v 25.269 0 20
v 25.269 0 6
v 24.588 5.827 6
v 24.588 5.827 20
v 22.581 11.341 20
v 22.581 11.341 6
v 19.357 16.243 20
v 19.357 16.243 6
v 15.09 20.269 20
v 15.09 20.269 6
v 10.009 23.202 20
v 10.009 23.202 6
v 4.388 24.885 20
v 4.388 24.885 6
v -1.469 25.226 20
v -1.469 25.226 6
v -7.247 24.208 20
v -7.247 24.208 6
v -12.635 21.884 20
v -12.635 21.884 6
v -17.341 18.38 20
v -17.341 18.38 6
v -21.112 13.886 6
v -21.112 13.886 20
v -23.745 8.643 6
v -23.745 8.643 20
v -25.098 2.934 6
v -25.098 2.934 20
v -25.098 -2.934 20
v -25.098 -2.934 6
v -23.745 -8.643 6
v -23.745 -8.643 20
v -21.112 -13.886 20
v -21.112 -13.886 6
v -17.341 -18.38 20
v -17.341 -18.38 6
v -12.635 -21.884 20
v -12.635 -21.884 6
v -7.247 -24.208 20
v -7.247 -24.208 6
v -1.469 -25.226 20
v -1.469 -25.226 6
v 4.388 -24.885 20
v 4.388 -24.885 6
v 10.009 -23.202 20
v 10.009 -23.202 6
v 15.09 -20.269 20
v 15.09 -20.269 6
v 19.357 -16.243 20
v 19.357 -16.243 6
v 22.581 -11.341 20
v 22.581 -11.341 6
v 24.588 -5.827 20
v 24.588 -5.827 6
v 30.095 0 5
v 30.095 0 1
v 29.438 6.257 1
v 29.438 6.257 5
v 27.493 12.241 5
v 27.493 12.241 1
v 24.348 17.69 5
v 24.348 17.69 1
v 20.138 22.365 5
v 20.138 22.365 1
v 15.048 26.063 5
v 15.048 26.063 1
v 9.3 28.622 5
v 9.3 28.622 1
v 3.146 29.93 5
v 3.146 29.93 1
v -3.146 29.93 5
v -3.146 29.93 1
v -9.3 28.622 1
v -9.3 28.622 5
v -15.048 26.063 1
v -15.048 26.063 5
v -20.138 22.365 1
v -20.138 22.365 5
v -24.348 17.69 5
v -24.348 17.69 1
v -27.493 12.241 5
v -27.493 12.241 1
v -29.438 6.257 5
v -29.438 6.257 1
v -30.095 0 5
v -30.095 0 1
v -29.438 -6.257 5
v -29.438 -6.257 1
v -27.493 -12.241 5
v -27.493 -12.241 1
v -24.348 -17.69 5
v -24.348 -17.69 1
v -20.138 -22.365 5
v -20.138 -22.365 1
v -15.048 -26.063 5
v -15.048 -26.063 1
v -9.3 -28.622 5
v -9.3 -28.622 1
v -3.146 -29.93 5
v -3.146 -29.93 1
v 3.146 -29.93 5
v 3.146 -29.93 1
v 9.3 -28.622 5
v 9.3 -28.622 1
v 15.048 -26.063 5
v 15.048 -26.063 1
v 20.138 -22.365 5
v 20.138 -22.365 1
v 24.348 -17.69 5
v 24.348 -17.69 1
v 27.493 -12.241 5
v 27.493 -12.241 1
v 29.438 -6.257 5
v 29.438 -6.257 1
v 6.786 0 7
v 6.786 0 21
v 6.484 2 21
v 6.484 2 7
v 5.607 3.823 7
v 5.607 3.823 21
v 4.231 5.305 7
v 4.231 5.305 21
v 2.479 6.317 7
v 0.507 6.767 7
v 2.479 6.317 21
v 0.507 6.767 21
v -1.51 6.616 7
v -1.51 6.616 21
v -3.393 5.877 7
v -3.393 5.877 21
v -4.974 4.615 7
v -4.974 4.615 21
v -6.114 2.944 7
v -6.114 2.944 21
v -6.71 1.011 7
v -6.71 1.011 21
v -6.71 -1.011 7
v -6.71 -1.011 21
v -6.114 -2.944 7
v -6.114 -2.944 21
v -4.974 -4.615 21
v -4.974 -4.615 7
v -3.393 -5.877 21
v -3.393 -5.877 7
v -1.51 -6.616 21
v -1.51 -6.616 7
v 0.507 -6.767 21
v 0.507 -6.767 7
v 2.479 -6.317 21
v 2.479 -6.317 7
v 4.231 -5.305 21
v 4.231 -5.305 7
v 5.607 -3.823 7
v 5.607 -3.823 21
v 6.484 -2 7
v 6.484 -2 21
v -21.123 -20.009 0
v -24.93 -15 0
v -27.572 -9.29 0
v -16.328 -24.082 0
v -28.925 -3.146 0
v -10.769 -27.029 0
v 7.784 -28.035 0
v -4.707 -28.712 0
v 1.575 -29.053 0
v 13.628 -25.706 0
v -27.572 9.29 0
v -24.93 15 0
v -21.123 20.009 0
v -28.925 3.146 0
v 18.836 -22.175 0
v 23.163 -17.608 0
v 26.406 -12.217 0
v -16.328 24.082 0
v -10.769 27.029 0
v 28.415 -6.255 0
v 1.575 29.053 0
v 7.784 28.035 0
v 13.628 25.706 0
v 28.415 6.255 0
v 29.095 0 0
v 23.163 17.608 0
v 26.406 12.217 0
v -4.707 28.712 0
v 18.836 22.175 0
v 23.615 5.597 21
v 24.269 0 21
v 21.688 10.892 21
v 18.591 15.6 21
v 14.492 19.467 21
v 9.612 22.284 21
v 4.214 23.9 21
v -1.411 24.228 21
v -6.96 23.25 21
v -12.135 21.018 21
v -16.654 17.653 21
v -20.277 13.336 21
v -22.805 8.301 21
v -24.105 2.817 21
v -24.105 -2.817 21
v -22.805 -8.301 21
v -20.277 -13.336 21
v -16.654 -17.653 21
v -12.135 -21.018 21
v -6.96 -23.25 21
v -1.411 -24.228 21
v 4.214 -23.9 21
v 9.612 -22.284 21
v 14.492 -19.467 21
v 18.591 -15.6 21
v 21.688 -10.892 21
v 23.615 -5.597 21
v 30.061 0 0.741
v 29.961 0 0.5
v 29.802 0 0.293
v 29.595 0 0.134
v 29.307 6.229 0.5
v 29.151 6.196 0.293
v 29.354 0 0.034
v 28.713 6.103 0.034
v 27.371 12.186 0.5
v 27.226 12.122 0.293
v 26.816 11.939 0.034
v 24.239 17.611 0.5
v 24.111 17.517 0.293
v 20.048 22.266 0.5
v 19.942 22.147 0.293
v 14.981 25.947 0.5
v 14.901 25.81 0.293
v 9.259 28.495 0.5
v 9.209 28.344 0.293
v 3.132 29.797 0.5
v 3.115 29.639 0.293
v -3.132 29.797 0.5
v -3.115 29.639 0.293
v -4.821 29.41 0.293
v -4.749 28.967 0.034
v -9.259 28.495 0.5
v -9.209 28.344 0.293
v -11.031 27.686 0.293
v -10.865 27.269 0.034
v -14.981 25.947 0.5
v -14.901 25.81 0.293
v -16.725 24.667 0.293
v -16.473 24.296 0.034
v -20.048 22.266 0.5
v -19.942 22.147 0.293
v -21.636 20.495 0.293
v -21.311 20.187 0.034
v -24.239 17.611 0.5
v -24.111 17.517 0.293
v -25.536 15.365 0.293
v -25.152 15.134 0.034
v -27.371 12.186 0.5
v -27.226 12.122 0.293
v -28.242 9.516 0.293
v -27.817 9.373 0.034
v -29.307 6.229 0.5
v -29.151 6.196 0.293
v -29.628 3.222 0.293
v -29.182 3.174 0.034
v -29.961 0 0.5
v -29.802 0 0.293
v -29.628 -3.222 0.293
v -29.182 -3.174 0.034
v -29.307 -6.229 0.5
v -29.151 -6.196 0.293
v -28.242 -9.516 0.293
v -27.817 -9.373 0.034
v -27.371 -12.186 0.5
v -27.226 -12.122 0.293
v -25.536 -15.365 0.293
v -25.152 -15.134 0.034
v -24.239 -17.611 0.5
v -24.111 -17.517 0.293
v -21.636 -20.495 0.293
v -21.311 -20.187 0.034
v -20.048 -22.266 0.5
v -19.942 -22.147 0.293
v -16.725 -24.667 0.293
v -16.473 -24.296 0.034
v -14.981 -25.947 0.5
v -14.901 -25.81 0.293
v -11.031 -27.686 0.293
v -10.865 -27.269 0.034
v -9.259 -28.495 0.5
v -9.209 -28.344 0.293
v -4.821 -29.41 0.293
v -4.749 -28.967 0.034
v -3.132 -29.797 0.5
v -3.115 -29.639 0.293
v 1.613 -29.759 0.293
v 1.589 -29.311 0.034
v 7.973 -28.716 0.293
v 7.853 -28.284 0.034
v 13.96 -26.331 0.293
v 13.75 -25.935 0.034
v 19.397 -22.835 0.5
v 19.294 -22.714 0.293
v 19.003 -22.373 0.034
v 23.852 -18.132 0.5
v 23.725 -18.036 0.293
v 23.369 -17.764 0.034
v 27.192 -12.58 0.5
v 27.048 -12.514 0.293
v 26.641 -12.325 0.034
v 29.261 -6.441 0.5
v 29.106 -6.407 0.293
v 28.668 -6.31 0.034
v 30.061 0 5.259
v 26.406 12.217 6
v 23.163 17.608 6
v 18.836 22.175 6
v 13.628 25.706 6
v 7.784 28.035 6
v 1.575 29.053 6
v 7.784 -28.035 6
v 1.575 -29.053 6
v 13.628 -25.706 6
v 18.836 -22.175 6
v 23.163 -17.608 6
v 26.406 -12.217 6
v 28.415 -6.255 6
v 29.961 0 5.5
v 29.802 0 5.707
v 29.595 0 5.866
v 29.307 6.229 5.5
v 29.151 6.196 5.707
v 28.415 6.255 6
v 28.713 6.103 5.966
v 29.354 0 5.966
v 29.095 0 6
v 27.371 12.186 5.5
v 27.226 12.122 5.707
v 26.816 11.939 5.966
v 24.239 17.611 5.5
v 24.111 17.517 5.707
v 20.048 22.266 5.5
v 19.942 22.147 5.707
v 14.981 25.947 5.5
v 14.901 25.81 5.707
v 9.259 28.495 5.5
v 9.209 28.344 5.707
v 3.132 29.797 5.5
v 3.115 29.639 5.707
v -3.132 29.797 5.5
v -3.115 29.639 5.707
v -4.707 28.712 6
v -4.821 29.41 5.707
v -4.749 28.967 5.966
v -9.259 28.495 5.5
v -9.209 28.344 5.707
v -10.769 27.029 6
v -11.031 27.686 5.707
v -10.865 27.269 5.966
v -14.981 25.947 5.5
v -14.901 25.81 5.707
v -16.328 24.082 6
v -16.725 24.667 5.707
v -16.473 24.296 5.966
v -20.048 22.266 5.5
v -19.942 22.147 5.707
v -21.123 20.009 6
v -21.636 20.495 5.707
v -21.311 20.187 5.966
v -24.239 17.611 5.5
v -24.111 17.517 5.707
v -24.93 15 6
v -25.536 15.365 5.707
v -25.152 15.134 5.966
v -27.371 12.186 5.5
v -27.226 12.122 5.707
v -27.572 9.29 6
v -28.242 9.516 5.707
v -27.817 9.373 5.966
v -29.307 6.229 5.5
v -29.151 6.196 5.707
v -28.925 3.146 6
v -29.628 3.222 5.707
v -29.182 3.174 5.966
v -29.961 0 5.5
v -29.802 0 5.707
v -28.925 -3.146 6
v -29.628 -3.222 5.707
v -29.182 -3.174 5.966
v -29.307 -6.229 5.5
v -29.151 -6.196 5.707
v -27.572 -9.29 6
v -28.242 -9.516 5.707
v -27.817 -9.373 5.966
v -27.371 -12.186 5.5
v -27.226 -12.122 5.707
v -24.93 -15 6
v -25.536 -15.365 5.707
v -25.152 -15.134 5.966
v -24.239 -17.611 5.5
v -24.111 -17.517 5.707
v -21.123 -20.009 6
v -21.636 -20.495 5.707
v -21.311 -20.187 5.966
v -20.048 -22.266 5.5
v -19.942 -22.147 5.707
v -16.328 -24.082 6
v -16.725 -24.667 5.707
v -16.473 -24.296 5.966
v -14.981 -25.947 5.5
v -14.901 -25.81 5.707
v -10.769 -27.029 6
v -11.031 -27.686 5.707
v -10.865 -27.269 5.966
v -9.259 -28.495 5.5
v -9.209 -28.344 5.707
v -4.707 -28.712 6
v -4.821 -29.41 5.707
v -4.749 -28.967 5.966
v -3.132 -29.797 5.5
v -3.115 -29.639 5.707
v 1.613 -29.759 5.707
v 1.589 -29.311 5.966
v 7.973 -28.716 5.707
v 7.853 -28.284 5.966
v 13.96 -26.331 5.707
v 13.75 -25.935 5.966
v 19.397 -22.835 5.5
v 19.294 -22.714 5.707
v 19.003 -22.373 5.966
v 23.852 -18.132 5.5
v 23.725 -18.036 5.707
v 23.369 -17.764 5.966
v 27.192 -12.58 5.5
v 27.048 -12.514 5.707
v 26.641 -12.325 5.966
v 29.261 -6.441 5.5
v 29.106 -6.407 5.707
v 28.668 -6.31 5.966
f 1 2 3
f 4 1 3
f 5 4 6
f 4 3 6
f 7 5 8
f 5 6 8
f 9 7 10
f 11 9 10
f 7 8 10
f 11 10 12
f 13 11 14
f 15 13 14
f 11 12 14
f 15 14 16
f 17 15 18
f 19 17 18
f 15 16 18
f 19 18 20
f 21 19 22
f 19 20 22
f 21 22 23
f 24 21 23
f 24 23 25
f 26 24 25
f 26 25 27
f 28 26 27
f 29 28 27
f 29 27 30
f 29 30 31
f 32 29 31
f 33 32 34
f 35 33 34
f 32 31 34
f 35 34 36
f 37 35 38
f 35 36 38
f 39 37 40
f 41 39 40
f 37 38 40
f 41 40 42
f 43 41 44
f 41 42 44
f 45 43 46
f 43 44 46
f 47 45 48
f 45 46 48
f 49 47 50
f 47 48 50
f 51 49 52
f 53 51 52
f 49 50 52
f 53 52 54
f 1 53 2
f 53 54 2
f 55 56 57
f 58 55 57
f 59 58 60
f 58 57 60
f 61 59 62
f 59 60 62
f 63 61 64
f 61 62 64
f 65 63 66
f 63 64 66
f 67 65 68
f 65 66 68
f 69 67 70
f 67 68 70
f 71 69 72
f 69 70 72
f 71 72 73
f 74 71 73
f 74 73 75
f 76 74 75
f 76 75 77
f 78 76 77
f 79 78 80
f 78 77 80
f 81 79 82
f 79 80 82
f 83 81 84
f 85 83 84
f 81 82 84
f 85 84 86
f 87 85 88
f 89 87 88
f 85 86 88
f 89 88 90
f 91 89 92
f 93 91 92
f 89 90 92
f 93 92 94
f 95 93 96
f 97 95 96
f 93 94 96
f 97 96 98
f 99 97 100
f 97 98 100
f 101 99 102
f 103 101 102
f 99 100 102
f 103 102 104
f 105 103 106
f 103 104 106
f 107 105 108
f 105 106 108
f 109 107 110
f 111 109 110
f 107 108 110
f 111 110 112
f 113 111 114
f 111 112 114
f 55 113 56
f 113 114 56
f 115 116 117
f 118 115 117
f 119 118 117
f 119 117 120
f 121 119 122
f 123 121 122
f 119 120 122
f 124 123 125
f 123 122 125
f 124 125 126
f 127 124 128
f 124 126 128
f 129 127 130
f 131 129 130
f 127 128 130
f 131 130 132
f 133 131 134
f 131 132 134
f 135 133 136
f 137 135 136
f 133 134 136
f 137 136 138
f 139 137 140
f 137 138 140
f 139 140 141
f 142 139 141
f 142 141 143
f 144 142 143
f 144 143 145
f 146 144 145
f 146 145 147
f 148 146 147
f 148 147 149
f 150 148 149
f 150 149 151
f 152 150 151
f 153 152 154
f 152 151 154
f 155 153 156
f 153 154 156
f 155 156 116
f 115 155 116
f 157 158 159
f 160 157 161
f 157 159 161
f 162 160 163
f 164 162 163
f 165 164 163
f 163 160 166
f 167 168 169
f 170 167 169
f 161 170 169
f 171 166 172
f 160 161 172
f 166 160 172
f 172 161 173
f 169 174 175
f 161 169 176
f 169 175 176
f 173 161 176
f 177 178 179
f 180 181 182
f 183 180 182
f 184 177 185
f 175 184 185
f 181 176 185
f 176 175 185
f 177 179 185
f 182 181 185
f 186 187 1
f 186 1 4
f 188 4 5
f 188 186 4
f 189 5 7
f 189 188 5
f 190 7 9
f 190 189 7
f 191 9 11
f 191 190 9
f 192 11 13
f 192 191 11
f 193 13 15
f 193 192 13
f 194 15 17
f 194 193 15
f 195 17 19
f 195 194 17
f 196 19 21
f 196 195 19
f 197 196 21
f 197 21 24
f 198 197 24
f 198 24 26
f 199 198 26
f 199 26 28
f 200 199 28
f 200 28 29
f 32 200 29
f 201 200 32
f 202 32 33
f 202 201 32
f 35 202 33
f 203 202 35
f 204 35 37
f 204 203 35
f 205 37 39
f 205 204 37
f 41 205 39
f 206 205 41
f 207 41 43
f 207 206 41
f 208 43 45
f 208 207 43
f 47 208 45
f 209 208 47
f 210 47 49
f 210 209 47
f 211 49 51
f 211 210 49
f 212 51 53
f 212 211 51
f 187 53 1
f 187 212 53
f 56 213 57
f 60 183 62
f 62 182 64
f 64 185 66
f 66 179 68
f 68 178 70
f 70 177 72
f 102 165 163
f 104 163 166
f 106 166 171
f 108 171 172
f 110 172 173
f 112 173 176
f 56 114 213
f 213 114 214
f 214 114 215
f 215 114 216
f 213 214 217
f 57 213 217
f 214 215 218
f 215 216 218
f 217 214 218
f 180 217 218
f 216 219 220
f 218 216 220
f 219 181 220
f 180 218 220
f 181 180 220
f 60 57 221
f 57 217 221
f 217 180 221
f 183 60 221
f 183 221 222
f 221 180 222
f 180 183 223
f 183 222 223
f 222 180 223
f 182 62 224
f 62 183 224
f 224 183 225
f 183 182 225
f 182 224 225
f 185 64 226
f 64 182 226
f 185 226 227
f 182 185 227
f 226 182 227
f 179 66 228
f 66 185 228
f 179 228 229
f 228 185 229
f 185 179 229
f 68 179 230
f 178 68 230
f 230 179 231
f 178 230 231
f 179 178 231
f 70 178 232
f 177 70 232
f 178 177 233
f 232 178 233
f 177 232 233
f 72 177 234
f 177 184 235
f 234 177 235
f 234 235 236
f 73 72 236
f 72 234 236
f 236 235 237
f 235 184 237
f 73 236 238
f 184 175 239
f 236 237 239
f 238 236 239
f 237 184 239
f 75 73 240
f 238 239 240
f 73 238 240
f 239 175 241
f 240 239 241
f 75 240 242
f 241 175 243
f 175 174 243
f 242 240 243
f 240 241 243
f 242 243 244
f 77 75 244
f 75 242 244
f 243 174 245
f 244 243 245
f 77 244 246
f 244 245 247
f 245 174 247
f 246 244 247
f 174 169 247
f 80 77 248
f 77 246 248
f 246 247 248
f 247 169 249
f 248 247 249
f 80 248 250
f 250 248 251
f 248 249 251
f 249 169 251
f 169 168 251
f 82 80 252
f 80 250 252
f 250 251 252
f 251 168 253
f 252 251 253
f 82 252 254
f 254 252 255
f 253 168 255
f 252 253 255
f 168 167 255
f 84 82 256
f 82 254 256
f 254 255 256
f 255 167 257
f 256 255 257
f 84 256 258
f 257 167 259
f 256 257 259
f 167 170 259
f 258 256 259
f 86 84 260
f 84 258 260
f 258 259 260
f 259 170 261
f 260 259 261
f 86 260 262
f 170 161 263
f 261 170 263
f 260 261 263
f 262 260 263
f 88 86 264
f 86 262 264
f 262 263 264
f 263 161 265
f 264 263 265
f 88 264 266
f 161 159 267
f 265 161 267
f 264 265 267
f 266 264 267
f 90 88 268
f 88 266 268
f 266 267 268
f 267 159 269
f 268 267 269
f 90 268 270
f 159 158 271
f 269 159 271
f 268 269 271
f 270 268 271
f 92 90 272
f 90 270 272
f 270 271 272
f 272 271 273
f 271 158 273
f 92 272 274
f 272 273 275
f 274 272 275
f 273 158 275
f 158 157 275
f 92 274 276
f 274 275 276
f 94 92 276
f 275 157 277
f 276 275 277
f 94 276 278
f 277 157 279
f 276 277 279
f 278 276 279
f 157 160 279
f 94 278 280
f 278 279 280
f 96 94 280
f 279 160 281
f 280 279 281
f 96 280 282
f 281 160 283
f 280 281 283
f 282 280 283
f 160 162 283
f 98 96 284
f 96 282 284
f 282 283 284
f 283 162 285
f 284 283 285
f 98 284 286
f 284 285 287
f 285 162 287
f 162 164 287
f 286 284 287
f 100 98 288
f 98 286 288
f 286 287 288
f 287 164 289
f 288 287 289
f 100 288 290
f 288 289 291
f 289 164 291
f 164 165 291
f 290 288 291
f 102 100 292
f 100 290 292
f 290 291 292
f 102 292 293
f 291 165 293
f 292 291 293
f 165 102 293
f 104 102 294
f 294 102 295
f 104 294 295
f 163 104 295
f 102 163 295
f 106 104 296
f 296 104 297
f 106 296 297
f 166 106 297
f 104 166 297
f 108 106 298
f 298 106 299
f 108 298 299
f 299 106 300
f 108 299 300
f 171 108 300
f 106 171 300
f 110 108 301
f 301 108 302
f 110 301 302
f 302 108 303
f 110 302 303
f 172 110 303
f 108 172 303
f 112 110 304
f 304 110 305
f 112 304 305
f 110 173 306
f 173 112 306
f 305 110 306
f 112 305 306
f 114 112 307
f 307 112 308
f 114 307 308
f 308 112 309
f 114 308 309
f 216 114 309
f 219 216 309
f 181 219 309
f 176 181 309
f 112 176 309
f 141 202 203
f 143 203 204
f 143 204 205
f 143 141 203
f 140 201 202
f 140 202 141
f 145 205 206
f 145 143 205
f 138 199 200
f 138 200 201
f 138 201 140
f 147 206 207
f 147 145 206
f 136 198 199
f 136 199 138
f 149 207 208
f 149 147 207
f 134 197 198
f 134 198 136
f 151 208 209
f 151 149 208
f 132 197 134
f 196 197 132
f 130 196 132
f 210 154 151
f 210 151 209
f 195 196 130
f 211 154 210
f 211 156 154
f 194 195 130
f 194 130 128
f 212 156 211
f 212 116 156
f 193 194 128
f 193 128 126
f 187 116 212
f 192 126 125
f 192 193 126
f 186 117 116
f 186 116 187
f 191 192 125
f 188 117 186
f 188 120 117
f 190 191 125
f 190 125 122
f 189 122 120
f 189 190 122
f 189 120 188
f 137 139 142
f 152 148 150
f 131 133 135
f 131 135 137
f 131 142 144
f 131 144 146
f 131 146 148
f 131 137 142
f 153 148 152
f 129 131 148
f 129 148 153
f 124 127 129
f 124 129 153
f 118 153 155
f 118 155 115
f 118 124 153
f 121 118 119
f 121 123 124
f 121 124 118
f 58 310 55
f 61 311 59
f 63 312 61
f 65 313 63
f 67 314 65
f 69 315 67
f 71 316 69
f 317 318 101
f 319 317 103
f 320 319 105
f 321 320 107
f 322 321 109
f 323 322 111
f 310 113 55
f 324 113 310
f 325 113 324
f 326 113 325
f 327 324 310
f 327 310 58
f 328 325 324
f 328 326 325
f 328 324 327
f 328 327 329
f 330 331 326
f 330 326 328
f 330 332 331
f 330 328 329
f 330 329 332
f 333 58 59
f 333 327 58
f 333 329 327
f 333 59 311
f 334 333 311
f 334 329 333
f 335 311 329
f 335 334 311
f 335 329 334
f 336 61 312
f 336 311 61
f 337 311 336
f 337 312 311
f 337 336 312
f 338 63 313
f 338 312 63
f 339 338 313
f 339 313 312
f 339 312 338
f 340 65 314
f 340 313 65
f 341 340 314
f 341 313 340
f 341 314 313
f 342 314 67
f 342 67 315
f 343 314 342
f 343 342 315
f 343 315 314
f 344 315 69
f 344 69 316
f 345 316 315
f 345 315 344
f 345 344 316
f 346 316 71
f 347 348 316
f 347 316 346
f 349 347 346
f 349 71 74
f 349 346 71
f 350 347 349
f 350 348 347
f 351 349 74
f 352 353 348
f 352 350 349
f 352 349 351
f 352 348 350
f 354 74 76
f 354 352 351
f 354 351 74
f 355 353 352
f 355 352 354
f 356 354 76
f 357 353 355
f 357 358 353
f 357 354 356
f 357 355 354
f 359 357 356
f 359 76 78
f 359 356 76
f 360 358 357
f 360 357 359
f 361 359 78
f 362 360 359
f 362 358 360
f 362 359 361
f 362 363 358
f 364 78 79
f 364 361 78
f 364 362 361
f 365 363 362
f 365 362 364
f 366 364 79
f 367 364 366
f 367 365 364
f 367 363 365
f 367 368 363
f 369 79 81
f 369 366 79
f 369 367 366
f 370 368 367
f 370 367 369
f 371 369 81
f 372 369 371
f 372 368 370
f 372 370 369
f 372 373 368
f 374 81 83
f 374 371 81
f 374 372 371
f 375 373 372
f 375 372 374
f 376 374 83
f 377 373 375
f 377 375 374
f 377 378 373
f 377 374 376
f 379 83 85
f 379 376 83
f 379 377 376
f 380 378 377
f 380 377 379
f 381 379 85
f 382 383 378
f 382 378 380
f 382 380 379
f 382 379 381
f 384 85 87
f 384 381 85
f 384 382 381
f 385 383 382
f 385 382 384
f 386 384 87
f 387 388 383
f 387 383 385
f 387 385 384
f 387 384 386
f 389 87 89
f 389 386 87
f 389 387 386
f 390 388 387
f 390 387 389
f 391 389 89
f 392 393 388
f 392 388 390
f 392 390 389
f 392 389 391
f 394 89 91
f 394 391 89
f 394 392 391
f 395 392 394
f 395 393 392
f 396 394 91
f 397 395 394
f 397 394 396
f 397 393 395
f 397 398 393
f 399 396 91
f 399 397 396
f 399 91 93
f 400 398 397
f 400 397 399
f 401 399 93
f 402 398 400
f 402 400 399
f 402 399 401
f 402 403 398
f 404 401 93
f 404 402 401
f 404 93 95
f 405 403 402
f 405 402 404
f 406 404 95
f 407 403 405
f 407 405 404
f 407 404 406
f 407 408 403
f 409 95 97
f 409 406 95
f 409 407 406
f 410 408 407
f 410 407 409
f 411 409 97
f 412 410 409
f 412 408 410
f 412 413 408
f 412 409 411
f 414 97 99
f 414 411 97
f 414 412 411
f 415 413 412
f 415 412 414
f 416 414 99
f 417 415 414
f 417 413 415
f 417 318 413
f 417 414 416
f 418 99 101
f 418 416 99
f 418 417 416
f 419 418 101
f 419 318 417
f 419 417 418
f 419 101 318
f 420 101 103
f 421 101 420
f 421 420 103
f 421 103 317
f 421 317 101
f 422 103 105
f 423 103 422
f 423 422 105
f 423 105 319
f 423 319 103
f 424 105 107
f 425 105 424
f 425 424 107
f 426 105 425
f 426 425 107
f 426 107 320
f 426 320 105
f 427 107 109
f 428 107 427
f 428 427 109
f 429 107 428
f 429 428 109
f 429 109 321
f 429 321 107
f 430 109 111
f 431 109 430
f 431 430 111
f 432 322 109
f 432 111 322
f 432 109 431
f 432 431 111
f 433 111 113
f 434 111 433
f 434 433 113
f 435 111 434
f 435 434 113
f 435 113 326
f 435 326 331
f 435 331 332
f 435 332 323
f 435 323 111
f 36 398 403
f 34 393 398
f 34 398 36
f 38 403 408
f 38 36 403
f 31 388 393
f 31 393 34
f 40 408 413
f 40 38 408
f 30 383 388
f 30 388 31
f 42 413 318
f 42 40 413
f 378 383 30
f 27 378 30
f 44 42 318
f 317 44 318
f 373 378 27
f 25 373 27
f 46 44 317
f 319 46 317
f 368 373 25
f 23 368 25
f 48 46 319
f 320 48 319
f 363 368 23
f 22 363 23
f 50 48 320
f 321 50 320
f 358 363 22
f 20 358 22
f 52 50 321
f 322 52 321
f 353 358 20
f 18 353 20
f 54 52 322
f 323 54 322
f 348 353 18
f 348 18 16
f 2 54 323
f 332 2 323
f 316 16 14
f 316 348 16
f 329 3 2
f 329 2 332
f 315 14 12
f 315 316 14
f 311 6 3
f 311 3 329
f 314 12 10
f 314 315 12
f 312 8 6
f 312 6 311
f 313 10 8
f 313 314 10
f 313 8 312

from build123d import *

# Parameters (mm, degrees)
F0_R     = 30.095245
F1_DEPTH = 6
F2_R     = 25.269078
F3_DEPTH = 15
F4_R     = 6.785687
F5_DEPTH = 14
F6_R     = 1
F7_R     = 1
F8_SIZE  = 1


with BuildPart() as f1:
    # F0 (on Top) → F1 (new body)
    with BuildSketch(Plane.XY):
        Circle(F0_R)
    extrude(amount=F1_DEPTH)

    # F2 (on face) → F3 (join)
    with BuildSketch(Plane.XY.offset(6)):
        Circle(F2_R)
    extrude(amount=F3_DEPTH)

    # F4 (on face) → F5 (cut)
    with BuildSketch(Plane.XY.offset(21)):
        Circle(F4_R)
    extrude(amount=-F5_DEPTH, mode=Mode.SUBTRACT)

    # F6
    f6_edges = [f1.edges().sort_by_distance(p)[0] for p in [
        (-30.095245, 0, 6),
    ]]
    fillet(f6_edges, radius=F6_R)

    # F7
    f7_edges = [f1.edges().sort_by_distance(p)[0] for p in [
        (-30.095245, 0, 0),
    ]]
    fillet(f7_edges, radius=F7_R)

    # F8
    f8_edges = [f1.edges().sort_by_distance(p)[0] for p in [
        (-25.269078, 0, 21),
    ]]
    chamfer(f8_edges, length=F8_SIZE)


solid = f1.part
